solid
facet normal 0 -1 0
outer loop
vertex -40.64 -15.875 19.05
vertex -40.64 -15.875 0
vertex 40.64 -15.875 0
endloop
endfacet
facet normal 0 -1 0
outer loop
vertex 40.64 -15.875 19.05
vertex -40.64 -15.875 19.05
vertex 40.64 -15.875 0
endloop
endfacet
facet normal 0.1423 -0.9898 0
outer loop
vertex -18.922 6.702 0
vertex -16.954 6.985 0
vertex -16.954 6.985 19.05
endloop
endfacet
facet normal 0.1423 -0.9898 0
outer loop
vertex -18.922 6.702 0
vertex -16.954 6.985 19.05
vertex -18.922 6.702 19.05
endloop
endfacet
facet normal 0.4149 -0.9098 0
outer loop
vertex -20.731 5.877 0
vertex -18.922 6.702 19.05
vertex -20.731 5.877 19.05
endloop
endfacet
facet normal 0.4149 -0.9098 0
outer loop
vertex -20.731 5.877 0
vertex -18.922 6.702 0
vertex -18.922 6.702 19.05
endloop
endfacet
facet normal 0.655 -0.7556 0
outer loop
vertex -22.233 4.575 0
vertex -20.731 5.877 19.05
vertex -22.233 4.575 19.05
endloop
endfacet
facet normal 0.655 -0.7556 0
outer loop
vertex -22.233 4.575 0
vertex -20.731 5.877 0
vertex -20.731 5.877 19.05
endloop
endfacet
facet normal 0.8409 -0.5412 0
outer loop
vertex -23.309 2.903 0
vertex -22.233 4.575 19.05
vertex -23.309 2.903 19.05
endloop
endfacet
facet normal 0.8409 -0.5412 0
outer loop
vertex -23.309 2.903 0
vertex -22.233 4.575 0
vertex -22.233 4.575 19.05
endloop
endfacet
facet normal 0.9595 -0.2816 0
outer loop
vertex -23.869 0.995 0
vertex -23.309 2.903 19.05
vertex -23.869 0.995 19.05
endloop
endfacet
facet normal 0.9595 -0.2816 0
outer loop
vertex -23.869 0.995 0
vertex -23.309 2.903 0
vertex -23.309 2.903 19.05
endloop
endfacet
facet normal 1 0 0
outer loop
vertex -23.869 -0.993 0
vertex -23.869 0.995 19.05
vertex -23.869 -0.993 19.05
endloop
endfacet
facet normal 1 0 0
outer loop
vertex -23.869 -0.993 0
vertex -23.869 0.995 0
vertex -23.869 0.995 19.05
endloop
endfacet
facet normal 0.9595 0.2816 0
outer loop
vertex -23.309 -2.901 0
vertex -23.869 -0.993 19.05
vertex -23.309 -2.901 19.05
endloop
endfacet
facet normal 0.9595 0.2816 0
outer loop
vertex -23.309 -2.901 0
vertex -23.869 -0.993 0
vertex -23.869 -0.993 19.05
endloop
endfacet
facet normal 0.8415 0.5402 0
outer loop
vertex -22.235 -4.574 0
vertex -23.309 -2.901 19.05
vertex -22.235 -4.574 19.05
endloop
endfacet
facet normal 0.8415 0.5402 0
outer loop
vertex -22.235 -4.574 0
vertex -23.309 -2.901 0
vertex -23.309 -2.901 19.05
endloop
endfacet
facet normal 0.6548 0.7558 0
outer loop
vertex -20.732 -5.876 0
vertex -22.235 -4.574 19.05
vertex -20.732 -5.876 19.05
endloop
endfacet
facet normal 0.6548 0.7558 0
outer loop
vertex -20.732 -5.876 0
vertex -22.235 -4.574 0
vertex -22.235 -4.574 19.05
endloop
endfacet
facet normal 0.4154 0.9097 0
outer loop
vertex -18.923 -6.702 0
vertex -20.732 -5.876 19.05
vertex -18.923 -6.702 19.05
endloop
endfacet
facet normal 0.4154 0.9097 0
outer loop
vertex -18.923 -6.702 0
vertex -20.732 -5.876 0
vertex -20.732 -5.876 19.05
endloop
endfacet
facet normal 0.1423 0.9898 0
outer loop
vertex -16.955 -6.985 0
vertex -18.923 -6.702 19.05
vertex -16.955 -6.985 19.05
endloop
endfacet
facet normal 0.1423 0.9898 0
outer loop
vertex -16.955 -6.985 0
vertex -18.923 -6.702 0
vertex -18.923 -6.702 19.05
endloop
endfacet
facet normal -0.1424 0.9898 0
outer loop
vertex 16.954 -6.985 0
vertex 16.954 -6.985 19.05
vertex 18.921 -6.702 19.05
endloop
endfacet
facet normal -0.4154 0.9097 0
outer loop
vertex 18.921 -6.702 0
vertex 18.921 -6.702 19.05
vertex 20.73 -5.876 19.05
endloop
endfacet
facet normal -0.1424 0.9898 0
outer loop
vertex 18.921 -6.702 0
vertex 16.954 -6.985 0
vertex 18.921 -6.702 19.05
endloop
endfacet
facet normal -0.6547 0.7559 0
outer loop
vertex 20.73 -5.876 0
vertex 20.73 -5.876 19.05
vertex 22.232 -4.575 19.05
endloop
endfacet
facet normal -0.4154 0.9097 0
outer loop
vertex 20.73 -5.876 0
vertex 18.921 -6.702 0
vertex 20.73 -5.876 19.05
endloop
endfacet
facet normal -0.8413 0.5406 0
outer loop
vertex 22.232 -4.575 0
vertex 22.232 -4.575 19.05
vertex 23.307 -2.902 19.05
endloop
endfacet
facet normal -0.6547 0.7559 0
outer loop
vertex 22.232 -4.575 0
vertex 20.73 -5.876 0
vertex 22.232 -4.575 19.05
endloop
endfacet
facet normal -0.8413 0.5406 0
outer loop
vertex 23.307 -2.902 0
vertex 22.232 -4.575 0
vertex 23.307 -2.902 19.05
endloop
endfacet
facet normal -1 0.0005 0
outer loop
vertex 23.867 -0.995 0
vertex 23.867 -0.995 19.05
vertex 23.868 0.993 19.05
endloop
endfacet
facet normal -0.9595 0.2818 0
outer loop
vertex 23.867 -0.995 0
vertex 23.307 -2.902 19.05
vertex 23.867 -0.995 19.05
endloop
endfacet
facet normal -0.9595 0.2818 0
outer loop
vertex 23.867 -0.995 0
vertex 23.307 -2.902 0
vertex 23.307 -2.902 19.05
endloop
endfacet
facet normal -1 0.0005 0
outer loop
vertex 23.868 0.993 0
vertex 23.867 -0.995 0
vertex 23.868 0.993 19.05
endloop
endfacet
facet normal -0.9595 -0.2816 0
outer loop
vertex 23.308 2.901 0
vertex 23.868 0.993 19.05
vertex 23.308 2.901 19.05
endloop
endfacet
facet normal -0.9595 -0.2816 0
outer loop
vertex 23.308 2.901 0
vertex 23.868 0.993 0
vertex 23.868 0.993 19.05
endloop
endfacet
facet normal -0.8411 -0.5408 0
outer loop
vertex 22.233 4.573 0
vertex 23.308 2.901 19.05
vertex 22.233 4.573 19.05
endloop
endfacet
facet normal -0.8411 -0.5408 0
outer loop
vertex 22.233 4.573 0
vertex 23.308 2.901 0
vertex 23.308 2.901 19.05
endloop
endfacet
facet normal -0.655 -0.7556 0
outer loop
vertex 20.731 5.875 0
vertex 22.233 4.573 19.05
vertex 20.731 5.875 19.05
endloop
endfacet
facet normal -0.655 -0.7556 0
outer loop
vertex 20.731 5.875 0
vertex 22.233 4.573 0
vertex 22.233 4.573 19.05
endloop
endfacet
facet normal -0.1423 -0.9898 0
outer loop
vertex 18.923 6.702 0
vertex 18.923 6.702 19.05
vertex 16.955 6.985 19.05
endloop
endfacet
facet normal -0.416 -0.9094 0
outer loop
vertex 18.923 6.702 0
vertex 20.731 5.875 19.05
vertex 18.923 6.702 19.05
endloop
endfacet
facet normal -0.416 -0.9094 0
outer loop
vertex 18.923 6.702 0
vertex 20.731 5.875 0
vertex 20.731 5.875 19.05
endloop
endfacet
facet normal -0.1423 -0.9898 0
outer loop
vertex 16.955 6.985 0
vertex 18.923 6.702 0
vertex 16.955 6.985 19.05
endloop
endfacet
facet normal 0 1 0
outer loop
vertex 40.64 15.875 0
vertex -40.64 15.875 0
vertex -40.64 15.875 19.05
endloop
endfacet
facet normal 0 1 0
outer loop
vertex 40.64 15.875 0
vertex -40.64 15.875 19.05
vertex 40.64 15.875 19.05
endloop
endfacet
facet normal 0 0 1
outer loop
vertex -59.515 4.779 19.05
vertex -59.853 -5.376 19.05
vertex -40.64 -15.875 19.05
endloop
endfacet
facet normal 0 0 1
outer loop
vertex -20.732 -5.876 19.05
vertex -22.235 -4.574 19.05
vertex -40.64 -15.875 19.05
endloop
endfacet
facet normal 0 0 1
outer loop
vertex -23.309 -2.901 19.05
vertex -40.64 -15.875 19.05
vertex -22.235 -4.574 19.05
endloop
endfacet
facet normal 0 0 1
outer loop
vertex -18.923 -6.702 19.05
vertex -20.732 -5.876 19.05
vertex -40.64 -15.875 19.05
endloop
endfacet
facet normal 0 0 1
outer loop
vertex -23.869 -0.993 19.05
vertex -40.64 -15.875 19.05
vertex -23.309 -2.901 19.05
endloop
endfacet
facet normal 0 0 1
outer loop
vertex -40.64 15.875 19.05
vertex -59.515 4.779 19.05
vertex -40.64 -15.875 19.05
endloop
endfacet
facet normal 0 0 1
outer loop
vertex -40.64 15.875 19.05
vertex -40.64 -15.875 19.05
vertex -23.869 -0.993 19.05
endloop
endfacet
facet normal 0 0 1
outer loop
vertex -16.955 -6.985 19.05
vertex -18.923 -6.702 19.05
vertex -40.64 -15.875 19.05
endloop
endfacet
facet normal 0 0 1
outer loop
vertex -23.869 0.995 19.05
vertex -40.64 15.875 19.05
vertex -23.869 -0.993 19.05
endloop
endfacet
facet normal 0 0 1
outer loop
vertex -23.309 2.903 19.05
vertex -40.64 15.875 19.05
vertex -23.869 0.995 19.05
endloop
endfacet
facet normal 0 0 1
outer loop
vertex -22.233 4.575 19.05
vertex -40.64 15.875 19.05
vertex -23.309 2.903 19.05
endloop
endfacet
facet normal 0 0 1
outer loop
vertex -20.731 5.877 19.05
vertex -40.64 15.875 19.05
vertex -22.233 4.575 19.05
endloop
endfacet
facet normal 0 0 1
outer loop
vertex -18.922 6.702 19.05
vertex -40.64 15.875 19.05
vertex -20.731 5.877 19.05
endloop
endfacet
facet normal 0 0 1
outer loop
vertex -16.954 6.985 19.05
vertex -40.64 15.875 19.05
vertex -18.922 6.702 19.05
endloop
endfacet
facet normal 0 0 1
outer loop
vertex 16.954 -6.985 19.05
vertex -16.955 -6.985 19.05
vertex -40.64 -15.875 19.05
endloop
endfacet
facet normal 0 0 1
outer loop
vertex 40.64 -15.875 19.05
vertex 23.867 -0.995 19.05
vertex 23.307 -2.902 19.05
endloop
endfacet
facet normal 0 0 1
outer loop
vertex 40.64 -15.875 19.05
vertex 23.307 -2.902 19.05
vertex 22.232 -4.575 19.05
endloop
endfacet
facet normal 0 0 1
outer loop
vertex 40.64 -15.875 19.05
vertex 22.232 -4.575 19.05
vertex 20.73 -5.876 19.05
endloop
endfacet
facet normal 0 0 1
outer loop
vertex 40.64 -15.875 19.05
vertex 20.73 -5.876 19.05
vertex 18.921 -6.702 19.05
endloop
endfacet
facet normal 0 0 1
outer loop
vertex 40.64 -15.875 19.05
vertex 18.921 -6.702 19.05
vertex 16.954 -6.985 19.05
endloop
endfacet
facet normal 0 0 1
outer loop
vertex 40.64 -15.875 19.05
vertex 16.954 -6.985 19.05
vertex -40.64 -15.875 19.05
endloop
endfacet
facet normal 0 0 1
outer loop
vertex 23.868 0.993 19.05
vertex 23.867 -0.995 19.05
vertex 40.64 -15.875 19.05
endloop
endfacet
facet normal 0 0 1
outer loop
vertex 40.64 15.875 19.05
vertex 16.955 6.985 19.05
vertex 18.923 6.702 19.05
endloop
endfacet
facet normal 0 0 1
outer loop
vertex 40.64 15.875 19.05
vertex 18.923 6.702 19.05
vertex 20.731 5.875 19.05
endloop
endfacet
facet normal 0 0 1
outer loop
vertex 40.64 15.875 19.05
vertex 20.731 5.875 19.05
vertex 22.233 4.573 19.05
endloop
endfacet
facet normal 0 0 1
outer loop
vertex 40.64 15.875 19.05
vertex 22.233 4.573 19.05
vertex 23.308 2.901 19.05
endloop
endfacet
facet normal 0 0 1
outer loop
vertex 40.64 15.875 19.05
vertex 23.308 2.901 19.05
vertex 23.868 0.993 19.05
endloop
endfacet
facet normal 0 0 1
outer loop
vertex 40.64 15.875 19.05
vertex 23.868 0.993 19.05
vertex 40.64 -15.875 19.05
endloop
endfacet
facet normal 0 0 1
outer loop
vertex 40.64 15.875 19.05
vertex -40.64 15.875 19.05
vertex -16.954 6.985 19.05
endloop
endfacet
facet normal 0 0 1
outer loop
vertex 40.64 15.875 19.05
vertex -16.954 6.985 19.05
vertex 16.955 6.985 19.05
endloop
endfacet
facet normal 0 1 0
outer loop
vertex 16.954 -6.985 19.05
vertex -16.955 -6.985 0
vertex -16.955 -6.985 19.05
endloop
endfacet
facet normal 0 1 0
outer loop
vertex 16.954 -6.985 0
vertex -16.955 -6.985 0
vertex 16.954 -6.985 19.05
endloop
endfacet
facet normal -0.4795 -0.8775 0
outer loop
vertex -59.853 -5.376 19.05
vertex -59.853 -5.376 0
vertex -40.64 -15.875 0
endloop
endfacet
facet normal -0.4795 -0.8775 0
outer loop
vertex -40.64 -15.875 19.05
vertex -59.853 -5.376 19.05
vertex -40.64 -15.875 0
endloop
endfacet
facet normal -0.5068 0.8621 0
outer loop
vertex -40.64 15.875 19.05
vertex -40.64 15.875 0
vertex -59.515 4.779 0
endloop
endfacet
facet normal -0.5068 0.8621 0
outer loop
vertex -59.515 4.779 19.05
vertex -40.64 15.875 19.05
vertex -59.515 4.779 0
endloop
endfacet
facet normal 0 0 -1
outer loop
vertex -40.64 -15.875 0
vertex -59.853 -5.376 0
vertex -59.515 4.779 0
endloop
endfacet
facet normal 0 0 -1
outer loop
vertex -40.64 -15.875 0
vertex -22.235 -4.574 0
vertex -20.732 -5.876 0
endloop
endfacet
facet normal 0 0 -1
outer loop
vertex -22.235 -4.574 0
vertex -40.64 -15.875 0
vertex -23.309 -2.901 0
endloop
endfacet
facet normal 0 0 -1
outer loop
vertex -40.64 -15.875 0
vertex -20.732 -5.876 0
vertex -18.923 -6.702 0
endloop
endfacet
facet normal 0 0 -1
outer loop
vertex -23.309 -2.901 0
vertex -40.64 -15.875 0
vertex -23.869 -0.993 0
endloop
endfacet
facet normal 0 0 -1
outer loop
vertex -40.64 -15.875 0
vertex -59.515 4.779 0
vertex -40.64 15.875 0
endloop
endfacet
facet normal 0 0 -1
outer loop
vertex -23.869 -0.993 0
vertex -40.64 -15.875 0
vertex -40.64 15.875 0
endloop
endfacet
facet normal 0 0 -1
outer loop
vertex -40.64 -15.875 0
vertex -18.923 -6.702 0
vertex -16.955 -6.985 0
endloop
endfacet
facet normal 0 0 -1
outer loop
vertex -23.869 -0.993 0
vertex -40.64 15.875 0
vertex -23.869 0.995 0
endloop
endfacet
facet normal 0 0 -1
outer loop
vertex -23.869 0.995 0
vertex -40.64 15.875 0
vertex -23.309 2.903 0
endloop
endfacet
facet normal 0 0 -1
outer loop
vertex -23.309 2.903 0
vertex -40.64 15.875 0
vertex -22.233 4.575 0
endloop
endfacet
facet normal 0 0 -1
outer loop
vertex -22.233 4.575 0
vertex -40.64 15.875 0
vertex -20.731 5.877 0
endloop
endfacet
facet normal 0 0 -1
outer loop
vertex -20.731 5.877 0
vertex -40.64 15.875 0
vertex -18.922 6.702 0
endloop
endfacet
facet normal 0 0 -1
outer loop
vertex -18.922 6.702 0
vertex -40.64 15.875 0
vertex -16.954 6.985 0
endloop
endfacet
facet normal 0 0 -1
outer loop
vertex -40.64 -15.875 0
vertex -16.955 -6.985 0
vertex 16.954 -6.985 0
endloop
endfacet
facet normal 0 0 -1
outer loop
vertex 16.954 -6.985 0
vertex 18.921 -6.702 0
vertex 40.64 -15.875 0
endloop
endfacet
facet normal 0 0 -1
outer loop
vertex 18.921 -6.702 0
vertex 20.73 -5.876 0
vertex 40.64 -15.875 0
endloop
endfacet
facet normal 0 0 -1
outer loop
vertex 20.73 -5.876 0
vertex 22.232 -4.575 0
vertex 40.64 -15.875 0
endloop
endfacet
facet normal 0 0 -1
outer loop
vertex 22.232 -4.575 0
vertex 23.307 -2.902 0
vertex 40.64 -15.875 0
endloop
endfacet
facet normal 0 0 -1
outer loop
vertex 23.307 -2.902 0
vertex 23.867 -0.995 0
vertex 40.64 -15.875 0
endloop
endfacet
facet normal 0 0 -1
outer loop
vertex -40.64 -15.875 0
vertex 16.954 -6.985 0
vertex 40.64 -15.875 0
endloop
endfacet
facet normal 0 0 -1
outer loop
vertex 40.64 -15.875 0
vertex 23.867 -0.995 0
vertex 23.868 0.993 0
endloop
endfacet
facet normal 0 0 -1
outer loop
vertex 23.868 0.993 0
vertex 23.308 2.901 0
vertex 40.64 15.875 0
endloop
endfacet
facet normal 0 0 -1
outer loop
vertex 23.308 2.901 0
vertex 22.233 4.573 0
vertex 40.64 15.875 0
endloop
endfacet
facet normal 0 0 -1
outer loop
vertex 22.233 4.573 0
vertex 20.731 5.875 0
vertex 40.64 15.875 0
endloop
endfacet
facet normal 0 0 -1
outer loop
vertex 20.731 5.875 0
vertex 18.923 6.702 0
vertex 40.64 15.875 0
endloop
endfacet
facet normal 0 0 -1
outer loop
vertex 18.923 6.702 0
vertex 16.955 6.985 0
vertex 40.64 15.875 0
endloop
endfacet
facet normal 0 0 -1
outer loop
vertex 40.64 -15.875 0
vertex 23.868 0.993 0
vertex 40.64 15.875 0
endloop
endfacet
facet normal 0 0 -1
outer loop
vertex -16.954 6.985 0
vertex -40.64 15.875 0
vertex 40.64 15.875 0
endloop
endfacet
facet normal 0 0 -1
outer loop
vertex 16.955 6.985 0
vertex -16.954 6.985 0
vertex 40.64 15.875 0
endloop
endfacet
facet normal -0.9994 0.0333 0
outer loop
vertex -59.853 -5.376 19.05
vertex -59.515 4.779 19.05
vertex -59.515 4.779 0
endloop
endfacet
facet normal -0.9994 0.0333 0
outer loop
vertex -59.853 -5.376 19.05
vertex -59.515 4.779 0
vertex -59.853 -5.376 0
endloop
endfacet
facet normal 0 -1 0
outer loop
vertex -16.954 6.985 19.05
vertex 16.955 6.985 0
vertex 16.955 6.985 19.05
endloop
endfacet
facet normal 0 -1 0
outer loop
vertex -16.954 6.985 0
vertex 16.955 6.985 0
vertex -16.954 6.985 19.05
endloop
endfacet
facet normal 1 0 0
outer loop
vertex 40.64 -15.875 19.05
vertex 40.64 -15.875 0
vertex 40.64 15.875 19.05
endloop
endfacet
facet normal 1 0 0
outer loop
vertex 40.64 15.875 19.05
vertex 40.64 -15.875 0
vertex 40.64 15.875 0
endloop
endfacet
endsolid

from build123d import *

# Parameters (mm, degrees)
F0_W          = 81.28
F0_H          = 31.75
F1_DEPTH      = 19.05
F3_DEPTH      = 19.304
F3_DEPTH_BACK = 19.05
F4_DEPTH      = 19.05


with BuildPart() as f1:
    # F0 (on Top) → F1 (new body)
    with BuildSketch(Plane.XY):
        Rectangle(F0_W, F0_H)
    extrude(amount=F1_DEPTH)

    # F2 (on Top) → F3 (cut, two sides)
    with BuildSketch(Plane.XY) as f3_sk:
        with BuildLine():
            ThreePointArc((-16.953665, 6.985), (-23.940335, 0.000835), (-16.955335, -6.985))
            Line((-16.955335, -6.985), (16.953665, -6.985))
            ThreePointArc((16.953665, -6.985), (23.938665, -0.000835), (16.955335, 6.985))
            Line((16.955335, 6.985), (-16.953665, 6.985))
        make_face()
    extrude(amount=F3_DEPTH, mode=Mode.SUBTRACT)
    extrude(f3_sk.sketch, amount=-F3_DEPTH_BACK, mode=Mode.SUBTRACT)

    # F0 (on Top) → F4 (join)
    with BuildSketch(Plane.XY):
        Polygon((-40.64, -15.875), (-40.64, 15.875), (-59.514749, 4.778779), (-59.853135, -5.375585), align=None)
    extrude(amount=F4_DEPTH)


solid = f1.part
